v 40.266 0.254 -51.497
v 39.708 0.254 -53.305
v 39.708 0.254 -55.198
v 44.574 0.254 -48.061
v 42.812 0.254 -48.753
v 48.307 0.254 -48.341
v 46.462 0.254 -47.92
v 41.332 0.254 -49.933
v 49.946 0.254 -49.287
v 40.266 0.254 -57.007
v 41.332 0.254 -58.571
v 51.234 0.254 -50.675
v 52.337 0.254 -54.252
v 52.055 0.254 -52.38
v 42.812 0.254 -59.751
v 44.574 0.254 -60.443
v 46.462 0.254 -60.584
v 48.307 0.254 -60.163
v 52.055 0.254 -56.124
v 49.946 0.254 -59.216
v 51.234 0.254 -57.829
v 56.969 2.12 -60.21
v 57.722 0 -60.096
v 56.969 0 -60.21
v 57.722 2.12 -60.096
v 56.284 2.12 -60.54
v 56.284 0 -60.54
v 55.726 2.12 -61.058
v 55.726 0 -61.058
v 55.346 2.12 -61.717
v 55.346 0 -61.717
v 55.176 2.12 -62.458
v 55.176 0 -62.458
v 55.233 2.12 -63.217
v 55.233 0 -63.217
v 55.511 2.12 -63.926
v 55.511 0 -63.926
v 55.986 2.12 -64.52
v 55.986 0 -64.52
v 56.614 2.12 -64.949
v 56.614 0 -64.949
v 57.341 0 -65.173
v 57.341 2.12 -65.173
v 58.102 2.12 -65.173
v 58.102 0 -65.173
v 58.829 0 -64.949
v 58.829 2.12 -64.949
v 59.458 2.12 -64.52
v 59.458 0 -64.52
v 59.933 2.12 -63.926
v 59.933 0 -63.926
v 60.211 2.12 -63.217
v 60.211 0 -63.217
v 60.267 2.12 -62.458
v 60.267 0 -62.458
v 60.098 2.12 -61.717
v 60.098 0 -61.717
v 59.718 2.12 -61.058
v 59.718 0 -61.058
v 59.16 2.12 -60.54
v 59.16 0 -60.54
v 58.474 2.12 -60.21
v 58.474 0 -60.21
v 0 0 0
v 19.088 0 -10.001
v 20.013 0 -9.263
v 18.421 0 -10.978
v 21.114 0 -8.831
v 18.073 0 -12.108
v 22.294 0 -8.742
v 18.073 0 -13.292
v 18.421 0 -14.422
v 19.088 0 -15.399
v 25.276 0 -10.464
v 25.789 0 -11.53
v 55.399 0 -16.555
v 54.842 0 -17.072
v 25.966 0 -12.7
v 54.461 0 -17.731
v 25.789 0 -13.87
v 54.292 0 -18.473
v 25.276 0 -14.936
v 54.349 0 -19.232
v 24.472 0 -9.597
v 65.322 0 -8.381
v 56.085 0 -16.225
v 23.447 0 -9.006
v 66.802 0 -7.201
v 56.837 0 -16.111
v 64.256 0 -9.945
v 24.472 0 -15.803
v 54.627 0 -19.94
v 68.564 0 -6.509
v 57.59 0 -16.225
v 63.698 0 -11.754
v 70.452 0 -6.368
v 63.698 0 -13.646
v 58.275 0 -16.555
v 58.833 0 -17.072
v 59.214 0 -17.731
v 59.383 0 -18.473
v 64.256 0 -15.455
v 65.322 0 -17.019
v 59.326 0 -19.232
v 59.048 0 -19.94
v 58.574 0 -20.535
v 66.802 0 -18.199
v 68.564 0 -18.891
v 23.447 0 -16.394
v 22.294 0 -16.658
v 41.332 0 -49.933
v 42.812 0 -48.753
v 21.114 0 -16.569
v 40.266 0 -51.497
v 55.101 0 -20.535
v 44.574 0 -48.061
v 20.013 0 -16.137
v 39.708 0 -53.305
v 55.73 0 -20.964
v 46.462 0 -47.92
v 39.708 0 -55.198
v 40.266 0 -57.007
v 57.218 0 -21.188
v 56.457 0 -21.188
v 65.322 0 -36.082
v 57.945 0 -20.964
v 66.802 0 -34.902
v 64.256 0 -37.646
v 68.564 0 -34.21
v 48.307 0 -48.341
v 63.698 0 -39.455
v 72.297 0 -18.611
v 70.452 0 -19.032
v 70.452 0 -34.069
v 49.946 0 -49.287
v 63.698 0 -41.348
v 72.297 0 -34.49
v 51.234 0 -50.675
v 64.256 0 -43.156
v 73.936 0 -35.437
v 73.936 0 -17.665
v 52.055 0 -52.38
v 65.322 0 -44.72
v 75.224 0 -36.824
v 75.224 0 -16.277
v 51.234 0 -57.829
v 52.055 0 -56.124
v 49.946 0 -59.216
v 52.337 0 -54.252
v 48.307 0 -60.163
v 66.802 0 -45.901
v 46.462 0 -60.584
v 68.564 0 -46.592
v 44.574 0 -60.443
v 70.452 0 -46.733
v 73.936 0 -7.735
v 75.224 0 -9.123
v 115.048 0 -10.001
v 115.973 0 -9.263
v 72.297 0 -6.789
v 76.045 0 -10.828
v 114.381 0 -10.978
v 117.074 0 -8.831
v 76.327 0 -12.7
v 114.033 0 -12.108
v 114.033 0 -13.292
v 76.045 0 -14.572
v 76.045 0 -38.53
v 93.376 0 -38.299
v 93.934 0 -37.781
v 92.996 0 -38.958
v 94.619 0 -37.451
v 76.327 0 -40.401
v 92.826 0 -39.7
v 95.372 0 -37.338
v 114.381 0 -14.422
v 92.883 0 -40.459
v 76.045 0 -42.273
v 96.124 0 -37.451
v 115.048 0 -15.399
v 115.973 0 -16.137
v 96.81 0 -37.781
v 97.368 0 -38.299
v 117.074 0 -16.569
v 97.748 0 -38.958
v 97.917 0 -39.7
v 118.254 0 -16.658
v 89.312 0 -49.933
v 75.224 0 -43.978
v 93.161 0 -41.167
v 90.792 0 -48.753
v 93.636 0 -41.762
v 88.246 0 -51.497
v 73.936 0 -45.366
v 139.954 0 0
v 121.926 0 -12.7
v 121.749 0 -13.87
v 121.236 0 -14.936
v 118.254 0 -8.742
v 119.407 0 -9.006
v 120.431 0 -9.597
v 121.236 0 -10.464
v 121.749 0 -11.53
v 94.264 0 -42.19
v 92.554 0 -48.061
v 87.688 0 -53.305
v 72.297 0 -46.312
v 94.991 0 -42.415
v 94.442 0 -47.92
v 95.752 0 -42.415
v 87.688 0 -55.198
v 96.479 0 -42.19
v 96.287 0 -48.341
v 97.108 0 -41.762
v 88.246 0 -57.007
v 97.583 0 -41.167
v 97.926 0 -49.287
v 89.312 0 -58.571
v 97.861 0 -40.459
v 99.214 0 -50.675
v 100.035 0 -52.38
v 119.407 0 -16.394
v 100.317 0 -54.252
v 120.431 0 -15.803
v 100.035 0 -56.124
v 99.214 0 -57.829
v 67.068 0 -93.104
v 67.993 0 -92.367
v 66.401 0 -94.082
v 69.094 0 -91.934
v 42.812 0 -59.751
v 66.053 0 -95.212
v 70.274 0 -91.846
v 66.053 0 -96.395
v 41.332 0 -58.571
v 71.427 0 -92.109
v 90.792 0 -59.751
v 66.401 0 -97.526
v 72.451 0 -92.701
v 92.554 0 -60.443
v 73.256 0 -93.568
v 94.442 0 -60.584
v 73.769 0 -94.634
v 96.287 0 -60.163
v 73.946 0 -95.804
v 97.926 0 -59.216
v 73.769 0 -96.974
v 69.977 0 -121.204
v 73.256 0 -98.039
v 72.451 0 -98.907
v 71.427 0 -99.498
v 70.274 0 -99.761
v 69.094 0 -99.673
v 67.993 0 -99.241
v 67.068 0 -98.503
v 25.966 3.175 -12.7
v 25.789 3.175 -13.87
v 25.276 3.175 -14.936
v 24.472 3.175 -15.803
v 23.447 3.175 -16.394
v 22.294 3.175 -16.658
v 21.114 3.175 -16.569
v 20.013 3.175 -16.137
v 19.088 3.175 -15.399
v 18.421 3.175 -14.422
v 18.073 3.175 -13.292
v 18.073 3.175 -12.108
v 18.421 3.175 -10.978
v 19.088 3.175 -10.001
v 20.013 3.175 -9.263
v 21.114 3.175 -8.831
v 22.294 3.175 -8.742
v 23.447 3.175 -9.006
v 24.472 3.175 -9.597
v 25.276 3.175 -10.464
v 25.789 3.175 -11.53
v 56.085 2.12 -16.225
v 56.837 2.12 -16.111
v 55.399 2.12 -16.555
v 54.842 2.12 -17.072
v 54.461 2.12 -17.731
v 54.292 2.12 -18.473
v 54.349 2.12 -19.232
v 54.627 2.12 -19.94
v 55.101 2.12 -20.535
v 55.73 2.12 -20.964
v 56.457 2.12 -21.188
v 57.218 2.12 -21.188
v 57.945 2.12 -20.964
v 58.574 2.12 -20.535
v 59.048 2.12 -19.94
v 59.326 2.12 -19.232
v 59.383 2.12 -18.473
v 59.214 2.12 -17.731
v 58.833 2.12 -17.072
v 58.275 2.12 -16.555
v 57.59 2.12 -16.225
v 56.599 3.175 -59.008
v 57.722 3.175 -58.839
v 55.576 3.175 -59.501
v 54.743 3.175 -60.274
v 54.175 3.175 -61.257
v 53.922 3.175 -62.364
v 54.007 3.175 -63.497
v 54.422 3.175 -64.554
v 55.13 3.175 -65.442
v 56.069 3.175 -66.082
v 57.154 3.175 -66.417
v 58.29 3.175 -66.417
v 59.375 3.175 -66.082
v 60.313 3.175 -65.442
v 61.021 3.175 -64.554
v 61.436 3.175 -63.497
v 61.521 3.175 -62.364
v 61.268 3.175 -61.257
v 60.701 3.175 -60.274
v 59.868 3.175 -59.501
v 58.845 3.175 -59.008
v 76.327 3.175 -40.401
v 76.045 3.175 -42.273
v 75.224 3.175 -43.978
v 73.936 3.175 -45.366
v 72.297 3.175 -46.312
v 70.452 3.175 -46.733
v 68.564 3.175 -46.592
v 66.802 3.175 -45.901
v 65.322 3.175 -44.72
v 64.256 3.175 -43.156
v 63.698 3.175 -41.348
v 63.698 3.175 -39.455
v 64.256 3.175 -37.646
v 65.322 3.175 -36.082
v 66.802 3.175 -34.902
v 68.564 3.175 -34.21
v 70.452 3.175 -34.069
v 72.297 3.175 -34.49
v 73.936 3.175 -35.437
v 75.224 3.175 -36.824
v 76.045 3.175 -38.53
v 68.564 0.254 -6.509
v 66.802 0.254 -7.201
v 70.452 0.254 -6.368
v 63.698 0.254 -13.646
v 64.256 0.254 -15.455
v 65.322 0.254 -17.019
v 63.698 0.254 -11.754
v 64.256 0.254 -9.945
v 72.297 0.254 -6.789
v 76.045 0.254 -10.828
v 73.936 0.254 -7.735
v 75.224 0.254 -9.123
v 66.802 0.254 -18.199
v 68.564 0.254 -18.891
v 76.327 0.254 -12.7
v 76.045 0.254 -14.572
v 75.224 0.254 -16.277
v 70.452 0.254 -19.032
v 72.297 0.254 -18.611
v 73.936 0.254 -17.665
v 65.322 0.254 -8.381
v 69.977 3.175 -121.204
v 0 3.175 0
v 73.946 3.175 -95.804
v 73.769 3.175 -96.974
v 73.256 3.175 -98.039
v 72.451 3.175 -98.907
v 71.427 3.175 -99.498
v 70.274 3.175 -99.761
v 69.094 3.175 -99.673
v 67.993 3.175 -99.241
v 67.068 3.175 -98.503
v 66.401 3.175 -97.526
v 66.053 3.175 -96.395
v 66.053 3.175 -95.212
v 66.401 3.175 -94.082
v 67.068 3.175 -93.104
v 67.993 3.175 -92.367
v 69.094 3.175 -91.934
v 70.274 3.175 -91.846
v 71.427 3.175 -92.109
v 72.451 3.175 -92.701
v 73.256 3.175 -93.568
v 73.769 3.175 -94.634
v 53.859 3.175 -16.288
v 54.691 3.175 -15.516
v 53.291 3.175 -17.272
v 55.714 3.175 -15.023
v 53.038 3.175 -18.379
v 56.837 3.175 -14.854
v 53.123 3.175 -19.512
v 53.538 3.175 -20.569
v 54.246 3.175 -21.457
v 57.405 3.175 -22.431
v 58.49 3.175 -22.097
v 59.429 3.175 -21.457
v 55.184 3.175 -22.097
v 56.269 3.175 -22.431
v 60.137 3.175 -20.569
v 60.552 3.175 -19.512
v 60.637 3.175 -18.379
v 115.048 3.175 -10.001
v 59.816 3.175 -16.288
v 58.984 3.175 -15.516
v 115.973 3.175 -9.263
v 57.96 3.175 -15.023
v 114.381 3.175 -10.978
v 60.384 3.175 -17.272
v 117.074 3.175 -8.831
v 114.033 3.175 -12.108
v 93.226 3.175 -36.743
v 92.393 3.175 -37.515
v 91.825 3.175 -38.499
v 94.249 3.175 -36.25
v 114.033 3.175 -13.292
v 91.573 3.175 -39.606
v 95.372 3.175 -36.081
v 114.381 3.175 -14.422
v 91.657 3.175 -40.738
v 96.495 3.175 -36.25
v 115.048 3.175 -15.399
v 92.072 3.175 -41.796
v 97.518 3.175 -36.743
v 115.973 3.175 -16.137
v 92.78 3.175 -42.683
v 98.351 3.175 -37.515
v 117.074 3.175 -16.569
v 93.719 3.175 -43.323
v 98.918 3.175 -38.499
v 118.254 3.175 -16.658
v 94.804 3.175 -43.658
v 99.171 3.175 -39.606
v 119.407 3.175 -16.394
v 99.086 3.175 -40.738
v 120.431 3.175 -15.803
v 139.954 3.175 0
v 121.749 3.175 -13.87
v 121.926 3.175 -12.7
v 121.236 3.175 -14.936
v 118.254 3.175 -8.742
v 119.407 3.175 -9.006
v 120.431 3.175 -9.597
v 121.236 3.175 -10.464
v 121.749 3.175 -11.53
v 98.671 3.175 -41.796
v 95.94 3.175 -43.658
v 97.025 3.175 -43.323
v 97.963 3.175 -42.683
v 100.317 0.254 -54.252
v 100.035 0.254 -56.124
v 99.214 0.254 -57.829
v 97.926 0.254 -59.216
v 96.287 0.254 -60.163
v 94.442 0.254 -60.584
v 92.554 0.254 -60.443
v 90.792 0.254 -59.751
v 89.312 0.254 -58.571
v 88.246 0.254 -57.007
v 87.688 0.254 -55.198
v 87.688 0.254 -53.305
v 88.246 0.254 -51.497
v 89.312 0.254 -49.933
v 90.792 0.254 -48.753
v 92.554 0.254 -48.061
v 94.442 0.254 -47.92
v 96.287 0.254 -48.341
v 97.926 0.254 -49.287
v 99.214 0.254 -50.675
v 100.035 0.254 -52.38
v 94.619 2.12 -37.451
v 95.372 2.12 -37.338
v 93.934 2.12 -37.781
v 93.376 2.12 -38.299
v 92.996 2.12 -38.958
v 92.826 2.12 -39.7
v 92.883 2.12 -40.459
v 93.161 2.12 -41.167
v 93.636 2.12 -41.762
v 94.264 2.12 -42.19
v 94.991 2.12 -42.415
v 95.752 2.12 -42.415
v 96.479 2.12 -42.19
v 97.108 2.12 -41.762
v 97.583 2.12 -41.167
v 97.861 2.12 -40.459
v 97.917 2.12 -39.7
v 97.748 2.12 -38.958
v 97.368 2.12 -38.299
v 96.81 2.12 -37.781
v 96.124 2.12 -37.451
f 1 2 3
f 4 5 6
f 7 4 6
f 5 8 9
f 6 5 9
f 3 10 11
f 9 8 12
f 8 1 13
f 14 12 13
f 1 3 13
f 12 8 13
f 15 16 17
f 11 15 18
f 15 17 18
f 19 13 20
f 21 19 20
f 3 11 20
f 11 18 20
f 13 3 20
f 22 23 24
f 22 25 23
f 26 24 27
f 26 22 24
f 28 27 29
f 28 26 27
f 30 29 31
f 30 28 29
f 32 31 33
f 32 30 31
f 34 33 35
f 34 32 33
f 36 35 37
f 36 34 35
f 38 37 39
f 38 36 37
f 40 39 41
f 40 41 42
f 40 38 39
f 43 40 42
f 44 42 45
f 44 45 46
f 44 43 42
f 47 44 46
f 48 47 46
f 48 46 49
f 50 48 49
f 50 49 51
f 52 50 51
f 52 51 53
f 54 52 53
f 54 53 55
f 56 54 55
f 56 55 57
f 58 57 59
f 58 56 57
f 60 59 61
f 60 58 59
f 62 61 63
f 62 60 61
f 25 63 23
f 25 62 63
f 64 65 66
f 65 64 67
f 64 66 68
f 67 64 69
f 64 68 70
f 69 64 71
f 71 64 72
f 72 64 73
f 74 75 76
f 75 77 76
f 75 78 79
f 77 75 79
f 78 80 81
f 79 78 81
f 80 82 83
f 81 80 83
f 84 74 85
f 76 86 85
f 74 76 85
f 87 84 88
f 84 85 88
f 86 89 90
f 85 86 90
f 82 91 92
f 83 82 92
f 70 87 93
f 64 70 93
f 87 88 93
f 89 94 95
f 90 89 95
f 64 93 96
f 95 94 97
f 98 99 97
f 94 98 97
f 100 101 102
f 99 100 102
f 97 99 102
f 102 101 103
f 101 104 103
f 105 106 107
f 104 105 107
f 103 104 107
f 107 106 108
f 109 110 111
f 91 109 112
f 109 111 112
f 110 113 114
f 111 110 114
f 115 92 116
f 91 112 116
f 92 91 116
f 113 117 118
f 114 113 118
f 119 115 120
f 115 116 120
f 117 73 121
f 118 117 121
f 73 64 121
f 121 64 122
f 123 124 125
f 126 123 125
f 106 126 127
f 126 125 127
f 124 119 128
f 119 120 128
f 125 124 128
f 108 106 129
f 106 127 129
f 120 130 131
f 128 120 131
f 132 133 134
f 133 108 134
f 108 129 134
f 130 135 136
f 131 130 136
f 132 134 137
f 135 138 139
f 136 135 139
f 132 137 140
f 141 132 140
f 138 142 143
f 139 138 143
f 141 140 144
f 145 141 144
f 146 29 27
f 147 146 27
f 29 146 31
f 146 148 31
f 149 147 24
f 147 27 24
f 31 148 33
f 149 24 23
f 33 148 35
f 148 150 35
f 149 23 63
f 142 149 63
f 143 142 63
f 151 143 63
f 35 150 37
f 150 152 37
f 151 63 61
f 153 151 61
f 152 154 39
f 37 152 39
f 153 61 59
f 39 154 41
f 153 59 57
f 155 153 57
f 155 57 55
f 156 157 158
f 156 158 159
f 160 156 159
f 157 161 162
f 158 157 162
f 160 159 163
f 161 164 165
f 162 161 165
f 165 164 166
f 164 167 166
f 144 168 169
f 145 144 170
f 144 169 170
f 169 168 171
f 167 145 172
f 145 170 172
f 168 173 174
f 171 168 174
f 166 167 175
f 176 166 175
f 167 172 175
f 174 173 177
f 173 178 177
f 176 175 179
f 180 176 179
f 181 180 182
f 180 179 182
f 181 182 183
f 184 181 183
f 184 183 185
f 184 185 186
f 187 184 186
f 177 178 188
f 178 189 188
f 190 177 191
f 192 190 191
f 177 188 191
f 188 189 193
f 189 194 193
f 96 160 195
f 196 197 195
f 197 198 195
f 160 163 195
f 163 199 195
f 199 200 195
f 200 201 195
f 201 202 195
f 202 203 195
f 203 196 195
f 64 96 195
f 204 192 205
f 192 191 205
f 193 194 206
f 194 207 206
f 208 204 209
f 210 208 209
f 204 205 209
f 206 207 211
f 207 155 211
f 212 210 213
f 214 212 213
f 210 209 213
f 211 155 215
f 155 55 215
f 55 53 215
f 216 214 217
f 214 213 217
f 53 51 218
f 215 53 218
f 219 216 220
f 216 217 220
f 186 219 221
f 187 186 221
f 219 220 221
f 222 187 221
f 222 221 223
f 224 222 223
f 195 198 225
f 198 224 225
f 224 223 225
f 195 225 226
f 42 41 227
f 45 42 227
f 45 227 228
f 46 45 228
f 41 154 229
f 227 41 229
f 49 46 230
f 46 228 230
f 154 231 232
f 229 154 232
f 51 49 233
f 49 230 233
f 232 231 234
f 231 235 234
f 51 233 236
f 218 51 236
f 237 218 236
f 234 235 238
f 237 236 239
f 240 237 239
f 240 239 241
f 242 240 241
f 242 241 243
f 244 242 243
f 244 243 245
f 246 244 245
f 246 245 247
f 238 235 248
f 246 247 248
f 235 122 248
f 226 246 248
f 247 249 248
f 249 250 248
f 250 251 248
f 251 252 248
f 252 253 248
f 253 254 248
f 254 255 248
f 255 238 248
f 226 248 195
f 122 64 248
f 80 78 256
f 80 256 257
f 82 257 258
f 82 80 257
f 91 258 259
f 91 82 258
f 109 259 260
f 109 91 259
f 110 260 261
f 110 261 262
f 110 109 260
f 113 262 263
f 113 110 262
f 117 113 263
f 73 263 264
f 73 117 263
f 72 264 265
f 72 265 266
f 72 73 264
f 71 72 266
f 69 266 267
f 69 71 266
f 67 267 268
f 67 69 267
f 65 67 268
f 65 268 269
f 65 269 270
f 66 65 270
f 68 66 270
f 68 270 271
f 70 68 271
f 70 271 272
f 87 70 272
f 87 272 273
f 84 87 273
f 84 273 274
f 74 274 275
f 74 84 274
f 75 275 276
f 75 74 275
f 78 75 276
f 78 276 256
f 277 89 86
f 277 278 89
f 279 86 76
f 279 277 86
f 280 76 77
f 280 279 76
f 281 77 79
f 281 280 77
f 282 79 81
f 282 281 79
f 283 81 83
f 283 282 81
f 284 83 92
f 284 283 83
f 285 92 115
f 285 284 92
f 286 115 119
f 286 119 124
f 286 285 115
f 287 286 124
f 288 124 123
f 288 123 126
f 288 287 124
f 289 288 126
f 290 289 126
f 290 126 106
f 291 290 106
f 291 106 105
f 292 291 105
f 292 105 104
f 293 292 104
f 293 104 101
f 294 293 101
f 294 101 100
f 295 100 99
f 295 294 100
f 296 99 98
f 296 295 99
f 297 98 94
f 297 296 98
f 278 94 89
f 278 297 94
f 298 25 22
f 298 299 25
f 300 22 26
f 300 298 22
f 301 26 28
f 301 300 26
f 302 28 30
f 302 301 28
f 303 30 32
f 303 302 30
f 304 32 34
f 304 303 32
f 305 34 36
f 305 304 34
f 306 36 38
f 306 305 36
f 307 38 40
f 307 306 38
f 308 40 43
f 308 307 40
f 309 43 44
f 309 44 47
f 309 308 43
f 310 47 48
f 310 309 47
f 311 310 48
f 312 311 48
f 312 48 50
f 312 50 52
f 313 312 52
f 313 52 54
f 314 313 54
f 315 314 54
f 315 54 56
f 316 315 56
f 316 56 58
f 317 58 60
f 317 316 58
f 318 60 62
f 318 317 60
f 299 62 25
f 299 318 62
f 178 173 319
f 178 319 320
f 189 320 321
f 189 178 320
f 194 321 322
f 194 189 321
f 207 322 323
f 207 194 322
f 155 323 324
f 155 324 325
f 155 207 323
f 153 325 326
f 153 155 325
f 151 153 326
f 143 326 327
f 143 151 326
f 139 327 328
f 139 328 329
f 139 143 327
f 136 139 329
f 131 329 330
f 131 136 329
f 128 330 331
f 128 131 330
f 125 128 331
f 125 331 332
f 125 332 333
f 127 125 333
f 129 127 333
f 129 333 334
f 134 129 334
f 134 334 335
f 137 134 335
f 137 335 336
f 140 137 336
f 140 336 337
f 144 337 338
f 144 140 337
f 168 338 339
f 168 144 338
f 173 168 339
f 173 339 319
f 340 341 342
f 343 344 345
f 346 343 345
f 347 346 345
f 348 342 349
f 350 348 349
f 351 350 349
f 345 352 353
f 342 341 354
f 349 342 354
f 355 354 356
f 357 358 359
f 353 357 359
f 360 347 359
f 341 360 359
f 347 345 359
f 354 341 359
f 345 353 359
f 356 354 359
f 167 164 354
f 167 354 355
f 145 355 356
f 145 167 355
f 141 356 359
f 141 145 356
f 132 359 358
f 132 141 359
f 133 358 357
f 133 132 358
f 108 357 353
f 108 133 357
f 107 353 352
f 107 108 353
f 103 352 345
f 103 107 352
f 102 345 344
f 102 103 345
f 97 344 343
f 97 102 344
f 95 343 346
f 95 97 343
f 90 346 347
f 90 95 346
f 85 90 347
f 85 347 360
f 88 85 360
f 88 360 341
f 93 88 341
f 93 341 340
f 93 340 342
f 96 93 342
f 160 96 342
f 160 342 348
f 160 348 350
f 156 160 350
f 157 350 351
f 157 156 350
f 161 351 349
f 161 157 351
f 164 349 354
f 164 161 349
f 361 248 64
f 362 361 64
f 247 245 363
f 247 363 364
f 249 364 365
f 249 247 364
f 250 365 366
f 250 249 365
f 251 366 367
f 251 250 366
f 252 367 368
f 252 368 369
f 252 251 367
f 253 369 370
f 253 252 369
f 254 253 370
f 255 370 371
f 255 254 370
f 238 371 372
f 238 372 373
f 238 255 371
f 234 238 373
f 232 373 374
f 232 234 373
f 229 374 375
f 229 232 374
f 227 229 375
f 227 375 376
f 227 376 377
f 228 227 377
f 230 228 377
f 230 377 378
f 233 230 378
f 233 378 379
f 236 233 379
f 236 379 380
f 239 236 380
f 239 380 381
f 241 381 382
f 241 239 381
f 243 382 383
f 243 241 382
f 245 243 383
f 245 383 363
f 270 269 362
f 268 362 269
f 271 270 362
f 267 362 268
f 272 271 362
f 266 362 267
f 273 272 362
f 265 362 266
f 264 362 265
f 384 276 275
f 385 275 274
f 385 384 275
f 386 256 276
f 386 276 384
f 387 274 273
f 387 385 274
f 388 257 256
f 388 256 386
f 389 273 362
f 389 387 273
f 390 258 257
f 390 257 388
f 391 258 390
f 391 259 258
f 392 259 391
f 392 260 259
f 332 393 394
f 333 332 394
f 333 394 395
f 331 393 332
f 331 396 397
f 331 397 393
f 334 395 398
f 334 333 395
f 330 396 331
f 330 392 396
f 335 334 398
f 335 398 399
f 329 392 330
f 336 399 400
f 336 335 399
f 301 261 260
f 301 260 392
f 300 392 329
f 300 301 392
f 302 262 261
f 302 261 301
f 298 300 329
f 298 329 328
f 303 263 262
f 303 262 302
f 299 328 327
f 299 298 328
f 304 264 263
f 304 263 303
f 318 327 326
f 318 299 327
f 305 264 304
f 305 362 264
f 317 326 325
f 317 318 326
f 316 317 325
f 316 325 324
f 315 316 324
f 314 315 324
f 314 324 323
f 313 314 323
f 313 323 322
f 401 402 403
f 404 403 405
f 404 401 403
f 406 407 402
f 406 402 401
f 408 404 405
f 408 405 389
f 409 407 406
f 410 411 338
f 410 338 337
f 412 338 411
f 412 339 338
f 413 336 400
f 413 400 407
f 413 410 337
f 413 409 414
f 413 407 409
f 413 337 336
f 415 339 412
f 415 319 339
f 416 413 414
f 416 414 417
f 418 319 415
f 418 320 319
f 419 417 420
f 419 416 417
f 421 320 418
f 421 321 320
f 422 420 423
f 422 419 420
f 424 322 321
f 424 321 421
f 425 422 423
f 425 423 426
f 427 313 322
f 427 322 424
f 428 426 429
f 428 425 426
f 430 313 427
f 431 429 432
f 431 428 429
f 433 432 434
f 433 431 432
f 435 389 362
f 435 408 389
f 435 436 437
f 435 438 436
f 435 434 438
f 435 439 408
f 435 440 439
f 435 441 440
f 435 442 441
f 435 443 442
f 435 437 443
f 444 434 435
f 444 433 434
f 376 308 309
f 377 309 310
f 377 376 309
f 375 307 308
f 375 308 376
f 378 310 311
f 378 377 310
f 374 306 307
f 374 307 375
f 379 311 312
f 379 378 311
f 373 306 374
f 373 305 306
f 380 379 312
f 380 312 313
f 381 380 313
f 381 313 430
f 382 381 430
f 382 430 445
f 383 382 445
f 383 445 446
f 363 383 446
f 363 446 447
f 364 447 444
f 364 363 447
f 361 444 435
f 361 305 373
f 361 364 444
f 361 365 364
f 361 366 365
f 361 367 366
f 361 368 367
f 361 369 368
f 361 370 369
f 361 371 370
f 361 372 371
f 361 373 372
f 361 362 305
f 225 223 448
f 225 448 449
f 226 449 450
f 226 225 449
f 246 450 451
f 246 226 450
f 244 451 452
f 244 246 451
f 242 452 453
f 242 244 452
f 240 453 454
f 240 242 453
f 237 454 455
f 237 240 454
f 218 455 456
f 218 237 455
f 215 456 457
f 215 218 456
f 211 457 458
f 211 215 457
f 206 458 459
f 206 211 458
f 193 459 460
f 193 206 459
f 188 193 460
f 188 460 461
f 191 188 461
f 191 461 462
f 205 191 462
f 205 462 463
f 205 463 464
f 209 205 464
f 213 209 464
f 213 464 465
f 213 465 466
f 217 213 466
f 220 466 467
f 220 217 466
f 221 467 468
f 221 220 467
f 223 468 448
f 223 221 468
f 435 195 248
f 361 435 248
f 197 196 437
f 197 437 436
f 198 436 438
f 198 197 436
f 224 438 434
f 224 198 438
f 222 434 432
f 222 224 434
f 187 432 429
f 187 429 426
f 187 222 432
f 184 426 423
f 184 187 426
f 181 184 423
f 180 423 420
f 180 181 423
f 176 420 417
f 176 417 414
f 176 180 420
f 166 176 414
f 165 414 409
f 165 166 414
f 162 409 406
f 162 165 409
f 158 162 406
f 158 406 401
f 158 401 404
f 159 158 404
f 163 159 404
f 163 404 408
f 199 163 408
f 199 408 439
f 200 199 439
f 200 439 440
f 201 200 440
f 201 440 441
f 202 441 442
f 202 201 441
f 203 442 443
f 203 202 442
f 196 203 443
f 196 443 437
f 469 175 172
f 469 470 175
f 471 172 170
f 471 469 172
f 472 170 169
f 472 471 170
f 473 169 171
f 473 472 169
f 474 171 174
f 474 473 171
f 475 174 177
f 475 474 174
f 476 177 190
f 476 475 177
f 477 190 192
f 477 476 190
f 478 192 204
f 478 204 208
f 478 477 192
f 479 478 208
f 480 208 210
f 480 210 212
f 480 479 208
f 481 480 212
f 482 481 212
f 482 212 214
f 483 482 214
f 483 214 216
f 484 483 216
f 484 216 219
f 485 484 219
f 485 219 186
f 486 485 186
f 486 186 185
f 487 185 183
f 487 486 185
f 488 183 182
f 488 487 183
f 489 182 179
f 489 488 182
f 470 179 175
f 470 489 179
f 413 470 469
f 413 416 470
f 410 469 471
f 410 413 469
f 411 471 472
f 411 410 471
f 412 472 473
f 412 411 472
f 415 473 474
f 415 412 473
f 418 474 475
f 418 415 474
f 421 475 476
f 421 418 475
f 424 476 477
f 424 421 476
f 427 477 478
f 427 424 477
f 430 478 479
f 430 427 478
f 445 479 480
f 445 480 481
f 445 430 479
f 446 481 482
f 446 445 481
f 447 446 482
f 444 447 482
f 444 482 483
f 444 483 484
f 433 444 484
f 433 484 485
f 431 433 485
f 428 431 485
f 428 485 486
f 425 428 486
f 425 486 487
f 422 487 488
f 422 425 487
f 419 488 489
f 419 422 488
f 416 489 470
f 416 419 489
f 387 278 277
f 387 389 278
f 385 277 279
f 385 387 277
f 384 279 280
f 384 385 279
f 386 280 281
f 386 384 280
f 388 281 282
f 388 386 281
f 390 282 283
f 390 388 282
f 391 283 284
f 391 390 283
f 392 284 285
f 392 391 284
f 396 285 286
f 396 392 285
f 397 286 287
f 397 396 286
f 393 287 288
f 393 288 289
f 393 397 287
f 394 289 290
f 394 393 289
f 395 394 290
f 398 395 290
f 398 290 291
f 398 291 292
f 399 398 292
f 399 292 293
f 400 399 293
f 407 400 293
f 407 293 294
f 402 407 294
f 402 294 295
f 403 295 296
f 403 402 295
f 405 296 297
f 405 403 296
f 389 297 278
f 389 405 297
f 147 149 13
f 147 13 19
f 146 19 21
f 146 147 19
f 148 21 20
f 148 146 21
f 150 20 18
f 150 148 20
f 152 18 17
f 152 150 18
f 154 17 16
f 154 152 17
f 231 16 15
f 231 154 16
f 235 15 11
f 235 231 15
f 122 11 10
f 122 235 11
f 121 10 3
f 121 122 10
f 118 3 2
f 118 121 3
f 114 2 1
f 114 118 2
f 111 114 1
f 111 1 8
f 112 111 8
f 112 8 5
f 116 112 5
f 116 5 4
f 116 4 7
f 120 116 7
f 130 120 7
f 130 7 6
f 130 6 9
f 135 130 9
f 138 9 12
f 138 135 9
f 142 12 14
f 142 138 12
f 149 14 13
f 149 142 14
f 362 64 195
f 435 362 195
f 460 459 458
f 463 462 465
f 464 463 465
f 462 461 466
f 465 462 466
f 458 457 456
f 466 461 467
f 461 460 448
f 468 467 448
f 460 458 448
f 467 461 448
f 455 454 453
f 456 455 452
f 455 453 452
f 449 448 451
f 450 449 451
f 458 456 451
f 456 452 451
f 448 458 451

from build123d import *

# Parameters (mm, degrees)
SKETCH1_R                        = 6.35
SKETCH1_R_2                      = 3.96875
BOSS_EXTRUDE1_DEPTH              = 3.175
SKETCH2_R                        = 6.35
CUT_EXTRUDE1_DEPTH               = 0.254
F_1_4_20_TAPPED_HOLE1_AT_2_COUNT = 2
F_1_4_20_TAPPED_HOLE1_AT_2_PITCH = 43.994090512
F_1_4_20_TAPPED_HOLE1_AT_3_COUNT = 2
F_1_4_20_TAPPED_HOLE1_AT_3_PITCH = 43.994090512


with BuildPart() as part:
    # Sketch1 → Boss-Extrude1 (new body)
    with BuildSketch(Plane(origin=(0, 0, 0), x_dir=(1, 0, 0), z_dir=(0, 1, 0))):
        Polygon((0, 0), (139.954, 0), (69.977, 121.203719361), align=None)
        with Locations((69.977, 40.401239787)):
            Circle(SKETCH1_R, mode=Mode.SUBTRACT)
        with Locations((117.956954744, 12.7)):
            Circle(SKETCH1_R_2, mode=Mode.SUBTRACT)
        with Locations((21.997045256, 12.7)):
            Circle(SKETCH1_R_2, mode=Mode.SUBTRACT)
        with Locations((69.977, 95.803719361)):
            Circle(SKETCH1_R_2, mode=Mode.SUBTRACT)
    extrude(amount=BOSS_EXTRUDE1_DEPTH)

    # Sketch2 → Cut-Extrude1 (cut)
    with BuildSketch(Plane(origin=(0, 0, 0), x_dir=(1, 0, 0), z_dir=(0, 1, 0))):
        with Locations((93.966977372, 54.251859681)):
            Circle(SKETCH2_R)
        with Locations((69.977, 12.7)):
            Circle(SKETCH2_R)
        with Locations((45.987022628, 54.251859681)):
            Circle(SKETCH2_R)
    extrude(amount=CUT_EXTRUDE1_DEPTH, mode=Mode.SUBTRACT)

    # Sketch4 → 1/4-20 Tapped Hole1 (revolve, cut)
    with BuildSketch(Plane(origin=(56.837296951, 3.175, -18.663985964), x_dir=(0, 0, 1), z_dir=(1, 0, 0))):
        Polygon((0, 0), (0, 3.175), (2.5527, 3.175), (2.5527, 1.054999966), (3.81, 0), align=None)
    f_1_4_20_tapped_hole1 = revolve(axis=Axis((56.837296951, 9.525, -18.663985964), (0, -1, 0)), mode=Mode.SUBTRACT)

    # 1/4-20 Tapped Hole1 at 2: 1/4-20 Tapped Hole1 ×2
    with Locations(*[Vector(0.875903289, 0, -0.482486712) * (i * F_1_4_20_TAPPED_HOLE1_AT_2_PITCH) for i in range(1, F_1_4_20_TAPPED_HOLE1_AT_2_COUNT)]):
        add(f_1_4_20_tapped_hole1, mode=Mode.SUBTRACT)

    # 1/4-20 Tapped Hole1 at 3: 1/4-20 Tapped Hole1 ×2
    with Locations(*[Vector(0.020105895, 0, -0.999797856) * (i * F_1_4_20_TAPPED_HOLE1_AT_3_PITCH) for i in range(1, F_1_4_20_TAPPED_HOLE1_AT_3_COUNT)]):
        add(f_1_4_20_tapped_hole1, mode=Mode.SUBTRACT)


solid = part.part
